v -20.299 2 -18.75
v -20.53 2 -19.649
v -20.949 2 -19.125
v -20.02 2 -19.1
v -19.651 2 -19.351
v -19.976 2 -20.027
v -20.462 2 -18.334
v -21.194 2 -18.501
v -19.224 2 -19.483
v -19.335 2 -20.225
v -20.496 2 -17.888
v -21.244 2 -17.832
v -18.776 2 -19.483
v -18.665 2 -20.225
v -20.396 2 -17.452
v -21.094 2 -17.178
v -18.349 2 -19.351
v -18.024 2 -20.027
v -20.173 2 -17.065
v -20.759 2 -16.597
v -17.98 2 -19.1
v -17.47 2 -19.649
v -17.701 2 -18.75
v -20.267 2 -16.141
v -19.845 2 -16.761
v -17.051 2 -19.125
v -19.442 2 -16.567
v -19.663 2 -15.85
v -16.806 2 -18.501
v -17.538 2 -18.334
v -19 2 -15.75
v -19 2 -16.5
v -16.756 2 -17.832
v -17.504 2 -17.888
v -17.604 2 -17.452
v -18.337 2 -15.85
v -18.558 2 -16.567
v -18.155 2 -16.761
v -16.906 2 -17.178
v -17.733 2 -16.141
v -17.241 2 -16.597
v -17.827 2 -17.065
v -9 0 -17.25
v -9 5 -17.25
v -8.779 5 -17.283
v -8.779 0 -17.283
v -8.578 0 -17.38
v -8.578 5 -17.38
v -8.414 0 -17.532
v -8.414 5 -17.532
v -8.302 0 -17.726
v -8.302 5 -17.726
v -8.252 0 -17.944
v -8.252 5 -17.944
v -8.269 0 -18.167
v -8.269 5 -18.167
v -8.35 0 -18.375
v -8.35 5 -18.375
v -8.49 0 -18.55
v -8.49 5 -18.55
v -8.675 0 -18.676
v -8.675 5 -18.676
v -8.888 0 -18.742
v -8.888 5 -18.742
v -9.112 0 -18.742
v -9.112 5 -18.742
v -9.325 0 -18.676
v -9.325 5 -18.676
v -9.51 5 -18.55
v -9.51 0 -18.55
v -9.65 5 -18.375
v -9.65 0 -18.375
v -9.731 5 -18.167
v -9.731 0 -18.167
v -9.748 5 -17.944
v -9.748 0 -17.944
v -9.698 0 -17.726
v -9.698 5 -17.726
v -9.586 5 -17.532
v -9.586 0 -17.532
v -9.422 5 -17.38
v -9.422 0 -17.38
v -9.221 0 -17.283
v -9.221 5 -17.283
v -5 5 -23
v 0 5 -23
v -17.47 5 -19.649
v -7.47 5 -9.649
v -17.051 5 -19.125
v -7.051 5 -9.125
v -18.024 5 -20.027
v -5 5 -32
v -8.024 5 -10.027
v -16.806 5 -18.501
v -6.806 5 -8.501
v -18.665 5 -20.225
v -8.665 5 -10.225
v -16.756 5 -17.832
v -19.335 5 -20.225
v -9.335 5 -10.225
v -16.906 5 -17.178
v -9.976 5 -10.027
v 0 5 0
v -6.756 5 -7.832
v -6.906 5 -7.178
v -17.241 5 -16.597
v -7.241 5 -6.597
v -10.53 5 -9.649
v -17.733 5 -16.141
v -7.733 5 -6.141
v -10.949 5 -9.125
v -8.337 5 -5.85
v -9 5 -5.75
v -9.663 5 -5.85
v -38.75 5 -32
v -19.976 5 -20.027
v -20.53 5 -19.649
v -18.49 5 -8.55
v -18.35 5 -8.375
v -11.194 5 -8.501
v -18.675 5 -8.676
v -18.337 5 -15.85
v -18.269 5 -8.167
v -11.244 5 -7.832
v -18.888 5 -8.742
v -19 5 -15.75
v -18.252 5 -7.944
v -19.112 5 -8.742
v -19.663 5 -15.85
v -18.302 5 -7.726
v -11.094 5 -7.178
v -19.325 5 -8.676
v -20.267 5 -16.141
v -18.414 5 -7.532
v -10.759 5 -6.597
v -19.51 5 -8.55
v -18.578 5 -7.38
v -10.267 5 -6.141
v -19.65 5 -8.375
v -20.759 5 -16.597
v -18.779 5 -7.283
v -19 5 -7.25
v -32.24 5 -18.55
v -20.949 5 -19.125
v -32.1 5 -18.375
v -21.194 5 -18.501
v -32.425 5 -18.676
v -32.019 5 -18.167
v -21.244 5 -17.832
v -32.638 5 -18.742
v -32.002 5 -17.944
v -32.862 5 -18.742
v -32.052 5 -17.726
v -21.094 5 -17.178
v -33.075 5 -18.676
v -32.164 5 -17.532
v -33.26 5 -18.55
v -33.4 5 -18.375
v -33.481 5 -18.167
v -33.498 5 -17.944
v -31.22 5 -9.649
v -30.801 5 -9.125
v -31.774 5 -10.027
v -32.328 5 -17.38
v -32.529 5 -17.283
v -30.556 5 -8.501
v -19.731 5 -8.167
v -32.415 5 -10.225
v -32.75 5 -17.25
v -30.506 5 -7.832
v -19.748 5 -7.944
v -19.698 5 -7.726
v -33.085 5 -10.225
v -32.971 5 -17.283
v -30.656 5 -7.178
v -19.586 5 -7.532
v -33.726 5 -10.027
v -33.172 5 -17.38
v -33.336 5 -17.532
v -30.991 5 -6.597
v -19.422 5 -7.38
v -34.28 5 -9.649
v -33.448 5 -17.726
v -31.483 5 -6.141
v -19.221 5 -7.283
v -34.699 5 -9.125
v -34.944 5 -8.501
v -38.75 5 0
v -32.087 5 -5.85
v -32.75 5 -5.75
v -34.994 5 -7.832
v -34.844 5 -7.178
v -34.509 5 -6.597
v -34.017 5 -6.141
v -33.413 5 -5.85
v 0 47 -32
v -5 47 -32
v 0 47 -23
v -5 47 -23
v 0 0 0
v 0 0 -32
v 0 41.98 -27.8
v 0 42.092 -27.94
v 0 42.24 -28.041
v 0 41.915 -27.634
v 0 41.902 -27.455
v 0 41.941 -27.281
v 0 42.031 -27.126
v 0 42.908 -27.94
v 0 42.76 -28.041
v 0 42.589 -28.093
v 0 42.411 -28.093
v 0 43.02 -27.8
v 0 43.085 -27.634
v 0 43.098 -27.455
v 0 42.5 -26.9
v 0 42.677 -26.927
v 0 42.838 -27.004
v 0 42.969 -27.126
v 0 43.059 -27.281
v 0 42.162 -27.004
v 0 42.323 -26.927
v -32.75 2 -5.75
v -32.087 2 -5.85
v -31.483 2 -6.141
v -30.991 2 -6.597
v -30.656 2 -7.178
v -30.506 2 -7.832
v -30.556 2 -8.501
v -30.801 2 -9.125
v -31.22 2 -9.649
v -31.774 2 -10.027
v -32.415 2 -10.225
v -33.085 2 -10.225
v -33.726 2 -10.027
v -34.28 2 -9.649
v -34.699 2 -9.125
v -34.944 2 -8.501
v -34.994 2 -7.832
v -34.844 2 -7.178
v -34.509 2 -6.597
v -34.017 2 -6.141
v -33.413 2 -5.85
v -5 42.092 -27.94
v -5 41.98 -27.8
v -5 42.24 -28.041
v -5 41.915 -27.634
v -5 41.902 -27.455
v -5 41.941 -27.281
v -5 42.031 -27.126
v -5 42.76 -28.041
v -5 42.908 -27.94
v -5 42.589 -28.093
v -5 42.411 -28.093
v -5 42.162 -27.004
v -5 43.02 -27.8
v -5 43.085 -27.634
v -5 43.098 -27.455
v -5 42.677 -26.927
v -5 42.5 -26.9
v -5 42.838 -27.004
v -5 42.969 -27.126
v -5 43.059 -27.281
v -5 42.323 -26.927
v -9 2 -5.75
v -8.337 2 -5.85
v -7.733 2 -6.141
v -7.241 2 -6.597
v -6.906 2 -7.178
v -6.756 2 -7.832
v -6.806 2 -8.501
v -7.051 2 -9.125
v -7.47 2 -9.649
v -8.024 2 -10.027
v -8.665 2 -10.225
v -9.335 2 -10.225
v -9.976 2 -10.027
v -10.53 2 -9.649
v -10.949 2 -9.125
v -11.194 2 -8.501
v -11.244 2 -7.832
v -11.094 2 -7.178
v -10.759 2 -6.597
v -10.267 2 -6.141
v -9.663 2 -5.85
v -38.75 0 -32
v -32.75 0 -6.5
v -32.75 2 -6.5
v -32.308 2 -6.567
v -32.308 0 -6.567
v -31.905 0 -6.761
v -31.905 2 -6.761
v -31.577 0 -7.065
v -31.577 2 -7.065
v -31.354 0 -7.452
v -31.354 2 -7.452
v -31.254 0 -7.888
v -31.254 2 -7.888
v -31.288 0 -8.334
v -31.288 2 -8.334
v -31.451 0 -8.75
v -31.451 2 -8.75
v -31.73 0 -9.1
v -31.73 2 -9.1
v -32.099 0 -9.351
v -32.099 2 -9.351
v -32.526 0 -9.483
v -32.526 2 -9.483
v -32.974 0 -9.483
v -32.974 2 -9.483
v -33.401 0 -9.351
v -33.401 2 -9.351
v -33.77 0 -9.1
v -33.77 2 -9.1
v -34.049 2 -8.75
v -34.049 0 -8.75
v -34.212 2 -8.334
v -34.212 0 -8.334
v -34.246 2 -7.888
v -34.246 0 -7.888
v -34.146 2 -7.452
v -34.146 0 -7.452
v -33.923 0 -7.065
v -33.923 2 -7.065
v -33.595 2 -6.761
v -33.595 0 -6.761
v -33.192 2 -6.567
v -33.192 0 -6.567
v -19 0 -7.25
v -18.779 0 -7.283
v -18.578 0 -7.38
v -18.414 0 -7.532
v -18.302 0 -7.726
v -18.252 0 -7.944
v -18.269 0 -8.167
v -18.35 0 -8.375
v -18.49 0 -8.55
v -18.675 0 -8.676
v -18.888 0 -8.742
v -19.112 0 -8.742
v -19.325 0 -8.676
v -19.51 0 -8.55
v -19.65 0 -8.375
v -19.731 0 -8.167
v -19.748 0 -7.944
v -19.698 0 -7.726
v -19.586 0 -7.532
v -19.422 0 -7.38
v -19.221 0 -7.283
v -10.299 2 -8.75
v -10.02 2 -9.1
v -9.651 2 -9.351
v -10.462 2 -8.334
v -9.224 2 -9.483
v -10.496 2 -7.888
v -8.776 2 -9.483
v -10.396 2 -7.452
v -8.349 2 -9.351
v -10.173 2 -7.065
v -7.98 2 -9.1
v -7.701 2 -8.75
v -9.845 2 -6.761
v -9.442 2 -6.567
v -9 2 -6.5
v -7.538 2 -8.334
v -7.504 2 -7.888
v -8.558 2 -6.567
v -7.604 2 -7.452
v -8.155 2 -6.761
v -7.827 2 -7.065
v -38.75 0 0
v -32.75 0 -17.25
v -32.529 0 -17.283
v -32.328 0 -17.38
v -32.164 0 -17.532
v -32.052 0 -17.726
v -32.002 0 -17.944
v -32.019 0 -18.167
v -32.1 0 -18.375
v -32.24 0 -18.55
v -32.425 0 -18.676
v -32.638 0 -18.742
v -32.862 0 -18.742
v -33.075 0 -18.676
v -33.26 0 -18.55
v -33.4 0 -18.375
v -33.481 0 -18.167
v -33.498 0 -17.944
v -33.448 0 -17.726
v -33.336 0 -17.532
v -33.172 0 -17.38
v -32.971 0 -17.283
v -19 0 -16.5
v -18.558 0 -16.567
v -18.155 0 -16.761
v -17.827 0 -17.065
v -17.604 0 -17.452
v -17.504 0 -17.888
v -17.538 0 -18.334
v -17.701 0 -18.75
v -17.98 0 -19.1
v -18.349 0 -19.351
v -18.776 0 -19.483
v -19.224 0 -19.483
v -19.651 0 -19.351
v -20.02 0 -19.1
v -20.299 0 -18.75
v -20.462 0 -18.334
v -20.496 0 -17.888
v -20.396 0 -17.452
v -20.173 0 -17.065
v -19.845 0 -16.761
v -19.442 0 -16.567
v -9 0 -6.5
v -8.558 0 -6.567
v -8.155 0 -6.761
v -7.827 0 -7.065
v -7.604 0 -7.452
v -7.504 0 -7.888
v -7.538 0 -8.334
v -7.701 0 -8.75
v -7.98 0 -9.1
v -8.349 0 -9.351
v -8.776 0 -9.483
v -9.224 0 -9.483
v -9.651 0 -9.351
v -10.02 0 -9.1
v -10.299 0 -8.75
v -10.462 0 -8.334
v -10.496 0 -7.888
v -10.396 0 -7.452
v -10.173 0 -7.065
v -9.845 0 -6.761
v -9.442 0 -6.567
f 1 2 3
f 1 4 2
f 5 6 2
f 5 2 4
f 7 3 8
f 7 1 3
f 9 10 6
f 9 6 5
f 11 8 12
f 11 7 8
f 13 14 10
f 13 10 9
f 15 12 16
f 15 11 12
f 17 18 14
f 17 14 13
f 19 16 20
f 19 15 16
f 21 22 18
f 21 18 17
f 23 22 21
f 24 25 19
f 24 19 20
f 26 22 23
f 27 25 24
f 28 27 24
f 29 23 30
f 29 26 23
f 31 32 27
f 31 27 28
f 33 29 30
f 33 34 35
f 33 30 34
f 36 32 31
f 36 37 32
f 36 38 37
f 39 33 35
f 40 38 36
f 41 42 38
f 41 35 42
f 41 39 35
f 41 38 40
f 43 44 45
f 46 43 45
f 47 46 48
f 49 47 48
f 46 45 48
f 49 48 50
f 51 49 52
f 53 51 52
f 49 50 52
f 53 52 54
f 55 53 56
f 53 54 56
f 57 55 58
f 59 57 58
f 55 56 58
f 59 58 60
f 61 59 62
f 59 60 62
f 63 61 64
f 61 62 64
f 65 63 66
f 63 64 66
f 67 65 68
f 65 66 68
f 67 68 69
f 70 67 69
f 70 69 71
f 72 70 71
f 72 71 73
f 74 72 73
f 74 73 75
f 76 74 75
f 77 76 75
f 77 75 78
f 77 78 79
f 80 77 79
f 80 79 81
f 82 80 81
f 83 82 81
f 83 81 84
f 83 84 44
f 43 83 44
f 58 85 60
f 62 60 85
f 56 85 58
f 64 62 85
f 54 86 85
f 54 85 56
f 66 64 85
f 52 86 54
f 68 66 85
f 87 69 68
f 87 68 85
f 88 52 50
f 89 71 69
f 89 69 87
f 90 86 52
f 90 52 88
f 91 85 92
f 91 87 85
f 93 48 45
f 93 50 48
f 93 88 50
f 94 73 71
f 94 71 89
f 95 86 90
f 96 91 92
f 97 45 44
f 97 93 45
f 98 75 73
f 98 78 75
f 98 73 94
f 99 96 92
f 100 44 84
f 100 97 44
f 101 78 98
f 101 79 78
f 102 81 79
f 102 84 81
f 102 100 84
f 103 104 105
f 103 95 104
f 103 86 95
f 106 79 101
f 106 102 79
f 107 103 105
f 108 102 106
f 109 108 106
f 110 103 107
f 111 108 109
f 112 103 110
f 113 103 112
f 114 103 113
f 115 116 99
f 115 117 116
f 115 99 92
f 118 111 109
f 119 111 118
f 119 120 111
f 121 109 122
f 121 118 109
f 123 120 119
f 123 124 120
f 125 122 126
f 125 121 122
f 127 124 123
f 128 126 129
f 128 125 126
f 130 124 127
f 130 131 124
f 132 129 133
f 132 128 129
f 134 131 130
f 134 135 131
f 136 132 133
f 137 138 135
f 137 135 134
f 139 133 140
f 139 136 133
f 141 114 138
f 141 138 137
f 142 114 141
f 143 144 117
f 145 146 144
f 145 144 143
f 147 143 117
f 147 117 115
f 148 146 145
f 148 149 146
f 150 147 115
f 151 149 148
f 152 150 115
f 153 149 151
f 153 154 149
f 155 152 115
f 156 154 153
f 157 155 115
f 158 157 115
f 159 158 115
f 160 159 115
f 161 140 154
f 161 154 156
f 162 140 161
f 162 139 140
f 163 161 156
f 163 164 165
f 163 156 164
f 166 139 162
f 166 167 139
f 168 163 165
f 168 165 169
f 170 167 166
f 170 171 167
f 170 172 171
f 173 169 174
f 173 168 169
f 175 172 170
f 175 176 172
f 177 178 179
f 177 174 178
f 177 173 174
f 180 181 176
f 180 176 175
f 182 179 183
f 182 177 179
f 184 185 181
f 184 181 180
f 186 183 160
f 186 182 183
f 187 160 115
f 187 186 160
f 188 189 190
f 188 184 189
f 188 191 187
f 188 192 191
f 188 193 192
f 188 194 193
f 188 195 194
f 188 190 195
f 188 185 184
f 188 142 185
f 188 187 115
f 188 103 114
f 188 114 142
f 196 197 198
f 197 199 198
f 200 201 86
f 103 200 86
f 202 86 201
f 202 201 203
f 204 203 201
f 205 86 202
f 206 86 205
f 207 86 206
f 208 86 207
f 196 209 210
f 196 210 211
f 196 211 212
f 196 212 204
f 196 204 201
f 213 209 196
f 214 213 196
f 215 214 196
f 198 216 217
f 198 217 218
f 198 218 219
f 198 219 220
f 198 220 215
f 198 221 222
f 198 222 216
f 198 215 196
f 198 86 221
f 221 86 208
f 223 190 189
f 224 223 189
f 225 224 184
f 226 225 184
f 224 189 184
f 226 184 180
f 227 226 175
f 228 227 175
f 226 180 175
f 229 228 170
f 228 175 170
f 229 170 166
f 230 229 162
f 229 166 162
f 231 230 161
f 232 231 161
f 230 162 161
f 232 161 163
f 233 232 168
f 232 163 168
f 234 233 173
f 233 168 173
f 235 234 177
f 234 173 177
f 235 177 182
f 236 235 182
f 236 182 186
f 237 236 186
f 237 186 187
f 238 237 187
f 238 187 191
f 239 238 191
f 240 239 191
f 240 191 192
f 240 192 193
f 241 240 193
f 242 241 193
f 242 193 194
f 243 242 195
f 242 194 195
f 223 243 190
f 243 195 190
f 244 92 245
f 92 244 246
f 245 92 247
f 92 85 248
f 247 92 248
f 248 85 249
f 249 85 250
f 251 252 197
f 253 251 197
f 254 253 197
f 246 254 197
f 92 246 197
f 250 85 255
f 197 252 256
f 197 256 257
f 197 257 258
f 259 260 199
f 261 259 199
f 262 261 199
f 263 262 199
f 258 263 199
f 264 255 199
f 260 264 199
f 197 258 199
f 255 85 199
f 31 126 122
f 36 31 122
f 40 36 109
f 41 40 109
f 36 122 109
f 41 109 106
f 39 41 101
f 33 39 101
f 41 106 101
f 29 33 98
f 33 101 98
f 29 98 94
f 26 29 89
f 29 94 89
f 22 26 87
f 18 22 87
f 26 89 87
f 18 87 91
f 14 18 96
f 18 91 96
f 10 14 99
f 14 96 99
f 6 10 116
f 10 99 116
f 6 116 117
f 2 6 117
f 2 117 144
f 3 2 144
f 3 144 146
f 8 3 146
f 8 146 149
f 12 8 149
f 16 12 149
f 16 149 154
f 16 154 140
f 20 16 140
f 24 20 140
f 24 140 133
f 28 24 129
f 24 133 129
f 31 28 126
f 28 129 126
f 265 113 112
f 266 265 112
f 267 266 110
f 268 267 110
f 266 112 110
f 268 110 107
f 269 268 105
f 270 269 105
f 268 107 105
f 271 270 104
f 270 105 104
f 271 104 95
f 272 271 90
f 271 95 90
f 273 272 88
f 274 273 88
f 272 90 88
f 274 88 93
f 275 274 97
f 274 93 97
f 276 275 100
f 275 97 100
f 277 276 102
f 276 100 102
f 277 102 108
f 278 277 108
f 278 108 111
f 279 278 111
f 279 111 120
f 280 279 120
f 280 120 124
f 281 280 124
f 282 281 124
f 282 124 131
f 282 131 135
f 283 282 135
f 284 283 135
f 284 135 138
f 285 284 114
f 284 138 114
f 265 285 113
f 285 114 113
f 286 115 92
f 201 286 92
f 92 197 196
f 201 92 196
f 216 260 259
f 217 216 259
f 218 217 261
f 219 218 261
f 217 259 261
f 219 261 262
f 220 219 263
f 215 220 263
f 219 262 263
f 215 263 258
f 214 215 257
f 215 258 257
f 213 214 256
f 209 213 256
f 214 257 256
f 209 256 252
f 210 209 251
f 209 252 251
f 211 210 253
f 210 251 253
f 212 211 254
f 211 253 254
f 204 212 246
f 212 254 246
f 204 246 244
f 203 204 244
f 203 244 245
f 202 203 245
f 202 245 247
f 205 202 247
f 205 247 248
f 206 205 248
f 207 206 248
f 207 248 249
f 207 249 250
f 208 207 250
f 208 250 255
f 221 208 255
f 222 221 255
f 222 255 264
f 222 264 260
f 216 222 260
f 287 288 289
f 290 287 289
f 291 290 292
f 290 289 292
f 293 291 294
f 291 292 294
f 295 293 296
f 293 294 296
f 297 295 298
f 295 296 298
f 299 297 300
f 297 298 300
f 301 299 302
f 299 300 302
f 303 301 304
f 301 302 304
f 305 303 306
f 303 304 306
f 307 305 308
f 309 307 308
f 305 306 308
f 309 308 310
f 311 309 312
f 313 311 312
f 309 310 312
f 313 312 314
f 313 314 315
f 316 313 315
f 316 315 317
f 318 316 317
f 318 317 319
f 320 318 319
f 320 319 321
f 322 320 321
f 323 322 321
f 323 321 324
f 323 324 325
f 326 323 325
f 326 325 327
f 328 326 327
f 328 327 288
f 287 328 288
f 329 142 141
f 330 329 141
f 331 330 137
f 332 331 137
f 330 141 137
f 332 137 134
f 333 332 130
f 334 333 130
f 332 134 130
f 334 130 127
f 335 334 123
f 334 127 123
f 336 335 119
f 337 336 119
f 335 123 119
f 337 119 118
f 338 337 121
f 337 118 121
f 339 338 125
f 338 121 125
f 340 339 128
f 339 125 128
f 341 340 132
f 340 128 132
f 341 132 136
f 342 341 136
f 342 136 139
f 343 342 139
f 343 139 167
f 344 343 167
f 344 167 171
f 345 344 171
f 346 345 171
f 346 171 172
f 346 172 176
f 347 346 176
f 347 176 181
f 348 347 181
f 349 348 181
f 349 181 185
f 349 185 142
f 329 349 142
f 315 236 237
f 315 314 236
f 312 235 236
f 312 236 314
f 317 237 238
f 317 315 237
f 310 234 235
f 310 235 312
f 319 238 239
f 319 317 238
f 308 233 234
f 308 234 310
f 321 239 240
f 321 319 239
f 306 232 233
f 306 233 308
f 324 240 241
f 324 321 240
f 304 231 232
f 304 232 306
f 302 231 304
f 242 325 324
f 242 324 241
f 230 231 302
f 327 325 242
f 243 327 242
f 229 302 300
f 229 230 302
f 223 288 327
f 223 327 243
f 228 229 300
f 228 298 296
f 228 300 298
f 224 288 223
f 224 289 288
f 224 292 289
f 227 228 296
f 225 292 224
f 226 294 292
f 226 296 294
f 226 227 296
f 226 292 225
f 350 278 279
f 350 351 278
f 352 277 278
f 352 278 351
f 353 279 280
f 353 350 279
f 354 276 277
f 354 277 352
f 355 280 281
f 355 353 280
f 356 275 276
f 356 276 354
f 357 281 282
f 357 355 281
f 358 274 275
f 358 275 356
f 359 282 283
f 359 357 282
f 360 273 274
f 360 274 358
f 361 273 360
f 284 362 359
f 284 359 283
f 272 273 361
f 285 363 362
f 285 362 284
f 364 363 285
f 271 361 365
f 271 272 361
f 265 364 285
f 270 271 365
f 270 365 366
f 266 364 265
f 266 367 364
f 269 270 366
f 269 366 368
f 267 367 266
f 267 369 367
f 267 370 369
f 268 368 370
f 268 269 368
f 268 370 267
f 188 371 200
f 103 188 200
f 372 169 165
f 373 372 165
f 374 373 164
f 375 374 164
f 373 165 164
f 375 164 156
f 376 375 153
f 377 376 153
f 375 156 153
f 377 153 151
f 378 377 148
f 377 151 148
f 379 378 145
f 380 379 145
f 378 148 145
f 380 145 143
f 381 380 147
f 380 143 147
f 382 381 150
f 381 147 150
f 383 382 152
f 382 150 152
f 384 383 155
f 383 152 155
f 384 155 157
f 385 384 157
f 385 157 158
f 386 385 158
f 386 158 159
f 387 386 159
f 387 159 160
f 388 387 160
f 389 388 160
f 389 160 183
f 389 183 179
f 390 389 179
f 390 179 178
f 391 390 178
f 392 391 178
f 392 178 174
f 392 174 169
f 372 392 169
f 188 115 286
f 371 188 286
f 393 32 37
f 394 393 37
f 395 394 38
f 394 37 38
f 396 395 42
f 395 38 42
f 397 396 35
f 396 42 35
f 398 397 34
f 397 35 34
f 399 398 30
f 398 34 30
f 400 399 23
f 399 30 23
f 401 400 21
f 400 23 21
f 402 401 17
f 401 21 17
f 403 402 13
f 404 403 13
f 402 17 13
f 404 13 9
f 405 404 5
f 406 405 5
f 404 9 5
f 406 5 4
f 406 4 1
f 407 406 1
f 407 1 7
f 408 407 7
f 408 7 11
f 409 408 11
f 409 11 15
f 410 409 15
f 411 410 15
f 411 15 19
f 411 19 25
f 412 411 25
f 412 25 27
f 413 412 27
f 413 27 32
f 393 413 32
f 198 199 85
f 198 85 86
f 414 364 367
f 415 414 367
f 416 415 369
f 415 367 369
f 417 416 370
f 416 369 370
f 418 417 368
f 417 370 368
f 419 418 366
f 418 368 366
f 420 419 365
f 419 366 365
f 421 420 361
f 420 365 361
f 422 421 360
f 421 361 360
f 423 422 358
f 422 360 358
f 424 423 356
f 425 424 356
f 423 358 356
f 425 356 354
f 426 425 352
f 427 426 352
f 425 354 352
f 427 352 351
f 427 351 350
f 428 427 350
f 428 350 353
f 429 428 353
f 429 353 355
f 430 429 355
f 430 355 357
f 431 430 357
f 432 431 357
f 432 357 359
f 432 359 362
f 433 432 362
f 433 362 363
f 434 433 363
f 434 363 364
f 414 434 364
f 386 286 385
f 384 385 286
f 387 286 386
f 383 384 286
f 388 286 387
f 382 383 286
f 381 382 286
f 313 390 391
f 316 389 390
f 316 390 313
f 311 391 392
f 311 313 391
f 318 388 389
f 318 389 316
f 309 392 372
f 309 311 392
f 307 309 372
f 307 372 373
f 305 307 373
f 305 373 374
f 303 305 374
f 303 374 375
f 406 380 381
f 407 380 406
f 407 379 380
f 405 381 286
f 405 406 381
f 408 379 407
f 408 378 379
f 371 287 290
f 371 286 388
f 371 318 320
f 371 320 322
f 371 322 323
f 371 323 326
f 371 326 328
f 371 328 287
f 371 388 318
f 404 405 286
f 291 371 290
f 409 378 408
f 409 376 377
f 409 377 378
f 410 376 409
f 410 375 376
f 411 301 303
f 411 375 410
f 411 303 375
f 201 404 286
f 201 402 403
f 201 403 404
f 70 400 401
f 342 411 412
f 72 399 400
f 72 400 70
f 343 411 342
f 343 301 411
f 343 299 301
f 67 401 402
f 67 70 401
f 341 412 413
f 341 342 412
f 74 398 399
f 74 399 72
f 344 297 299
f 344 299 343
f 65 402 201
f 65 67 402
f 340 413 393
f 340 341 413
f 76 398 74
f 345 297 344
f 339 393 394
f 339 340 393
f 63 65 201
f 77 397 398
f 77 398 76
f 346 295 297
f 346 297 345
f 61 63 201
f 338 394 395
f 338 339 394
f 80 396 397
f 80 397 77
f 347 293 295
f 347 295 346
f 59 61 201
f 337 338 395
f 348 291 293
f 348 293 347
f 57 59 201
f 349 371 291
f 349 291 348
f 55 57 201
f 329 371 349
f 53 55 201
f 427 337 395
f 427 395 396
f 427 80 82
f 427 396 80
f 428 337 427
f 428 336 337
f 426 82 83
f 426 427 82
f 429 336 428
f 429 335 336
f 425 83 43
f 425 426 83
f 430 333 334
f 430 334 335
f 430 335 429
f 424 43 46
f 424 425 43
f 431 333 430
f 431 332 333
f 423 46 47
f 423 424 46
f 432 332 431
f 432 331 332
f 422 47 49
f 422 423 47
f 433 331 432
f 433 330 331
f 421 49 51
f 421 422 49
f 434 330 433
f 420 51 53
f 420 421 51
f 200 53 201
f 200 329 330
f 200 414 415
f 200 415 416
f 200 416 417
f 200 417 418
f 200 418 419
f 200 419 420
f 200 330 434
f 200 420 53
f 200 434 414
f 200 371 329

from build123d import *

# Parameters (mm, degrees)
SKETCH_1_W          = 38.75
SKETCH_1_H          = 30
EXTRUDE_1_DEPTH     = 5
SKETCH_1_15_W       = 5
SKETCH_1_15_H       = 5
EXTRUDE_2_DEPTH     = 47
SKETCH_2_R          = 0.6
CUT_EXTRUDE_1_DEPTH = 66.177162411
SKETCH_3_R          = 1.5
SKETCH_3_R_2        = 0.75
CUT_EXTRUDE_2_DEPTH = 65.541169032
SKETCH_3_3_R        = 2.25
CUT_EXTRUDE_3_DEPTH = 3
SKETCH_4_W          = 5
SKETCH_4_H          = 42
EXTRUDE_3_DEPTH     = 2
EXTRUDE_START       = -5
SKETCH_4_3_W        = 5
SKETCH_4_3_H        = 42
EXTRUDE_4_DEPTH     = 2


with BuildPart() as part:
    # 草图1 → 凸台-拉伸1 (new body)
    with BuildSketch(Plane(origin=(0, 0, 0), x_dir=(1, 0, 0), z_dir=(0, 1, 0))):
        with Locations((-19.375, 15)):
            Rectangle(SKETCH_1_W, SKETCH_1_H)
    extrude(amount=EXTRUDE_1_DEPTH)

    # 草图1<15> → 凸台-拉伸2 (add)
    with BuildSketch(Plane(origin=(0, 0, 0), x_dir=(1, 0, 0), z_dir=(0, 1, 0))):
        with Locations((-2.5, 27.5)):
            Rectangle(SKETCH_1_15_W, SKETCH_1_15_H)
    extrude(amount=EXTRUDE_2_DEPTH)

    # 草图2 → 切除-拉伸1 (cut, through all)
    with BuildSketch(Plane.ZY.offset(5)):
        with Locations((-27.5, 42.5)):
            Circle(SKETCH_2_R)
    extrude(amount=-CUT_EXTRUDE_1_DEPTH, mode=Mode.SUBTRACT)

    # 草图3 → 切除-拉伸2 (cut, through all)
    with BuildSketch(Plane(origin=(0, 5, 0), x_dir=(1, 0, 0), z_dir=(0, 1, 0))):
        with Locations(Location((-9, 8, 0), (0, 0, 270))):
            Circle(SKETCH_3_R)
        with Locations(Location((-32.75, 8, 0), (0, 0, 270))):
            Circle(SKETCH_3_R)
        with Locations(Location((-19, 18, 0), (0, 0, 270))):
            Circle(SKETCH_3_R)
        with Locations(Location((-32.75, 18, 0), (0, 0, 270))):
            Circle(SKETCH_3_R_2)
        with Locations(Location((-9, 18, 0), (0, 0, 270))):
            Circle(SKETCH_3_R_2)
        with Locations(Location((-19, 8, 0), (0, 0, 270))):
            Circle(SKETCH_3_R_2)
    extrude(amount=-CUT_EXTRUDE_2_DEPTH, mode=Mode.SUBTRACT)

    # 草图3<3> → 切除-拉伸3 (cut)
    with BuildSketch(Plane(origin=(0, 5, 0), x_dir=(1, 0, 0), z_dir=(0, 1, 0))):
        with Locations(Location((-19, 18, 0), (0, 0, 270))):
            Circle(SKETCH_3_3_R)
        with Locations(Location((-32.75, 8, 0), (0, 0, 270))):
            Circle(SKETCH_3_3_R)
        with Locations(Location((-9, 8, 0), (0, 0, 270))):
            Circle(SKETCH_3_3_R)
    extrude(amount=-CUT_EXTRUDE_3_DEPTH, mode=Mode.SUBTRACT)

    # 草图4 → 凸台-拉伸3 (add)
    with BuildSketch(Plane.XY.offset(-25)):
        with Locations((-2.5, 26)):
            Rectangle(SKETCH_4_W, SKETCH_4_H)
    extrude(amount=EXTRUDE_3_DEPTH)

    # 草图4<3> → 凸台-拉伸4 (add)
    with BuildSketch(Plane.XY.offset(-25).offset(EXTRUDE_START)):
        with Locations((-2.5, 26)):
            Rectangle(SKETCH_4_3_W, SKETCH_4_3_H)
        Polygon((0, 0), (0, 5), (-5, 5), (-38.75, 5), (-38.75, 0), align=None)
    extrude(amount=-EXTRUDE_4_DEPTH)


solid = part.part
